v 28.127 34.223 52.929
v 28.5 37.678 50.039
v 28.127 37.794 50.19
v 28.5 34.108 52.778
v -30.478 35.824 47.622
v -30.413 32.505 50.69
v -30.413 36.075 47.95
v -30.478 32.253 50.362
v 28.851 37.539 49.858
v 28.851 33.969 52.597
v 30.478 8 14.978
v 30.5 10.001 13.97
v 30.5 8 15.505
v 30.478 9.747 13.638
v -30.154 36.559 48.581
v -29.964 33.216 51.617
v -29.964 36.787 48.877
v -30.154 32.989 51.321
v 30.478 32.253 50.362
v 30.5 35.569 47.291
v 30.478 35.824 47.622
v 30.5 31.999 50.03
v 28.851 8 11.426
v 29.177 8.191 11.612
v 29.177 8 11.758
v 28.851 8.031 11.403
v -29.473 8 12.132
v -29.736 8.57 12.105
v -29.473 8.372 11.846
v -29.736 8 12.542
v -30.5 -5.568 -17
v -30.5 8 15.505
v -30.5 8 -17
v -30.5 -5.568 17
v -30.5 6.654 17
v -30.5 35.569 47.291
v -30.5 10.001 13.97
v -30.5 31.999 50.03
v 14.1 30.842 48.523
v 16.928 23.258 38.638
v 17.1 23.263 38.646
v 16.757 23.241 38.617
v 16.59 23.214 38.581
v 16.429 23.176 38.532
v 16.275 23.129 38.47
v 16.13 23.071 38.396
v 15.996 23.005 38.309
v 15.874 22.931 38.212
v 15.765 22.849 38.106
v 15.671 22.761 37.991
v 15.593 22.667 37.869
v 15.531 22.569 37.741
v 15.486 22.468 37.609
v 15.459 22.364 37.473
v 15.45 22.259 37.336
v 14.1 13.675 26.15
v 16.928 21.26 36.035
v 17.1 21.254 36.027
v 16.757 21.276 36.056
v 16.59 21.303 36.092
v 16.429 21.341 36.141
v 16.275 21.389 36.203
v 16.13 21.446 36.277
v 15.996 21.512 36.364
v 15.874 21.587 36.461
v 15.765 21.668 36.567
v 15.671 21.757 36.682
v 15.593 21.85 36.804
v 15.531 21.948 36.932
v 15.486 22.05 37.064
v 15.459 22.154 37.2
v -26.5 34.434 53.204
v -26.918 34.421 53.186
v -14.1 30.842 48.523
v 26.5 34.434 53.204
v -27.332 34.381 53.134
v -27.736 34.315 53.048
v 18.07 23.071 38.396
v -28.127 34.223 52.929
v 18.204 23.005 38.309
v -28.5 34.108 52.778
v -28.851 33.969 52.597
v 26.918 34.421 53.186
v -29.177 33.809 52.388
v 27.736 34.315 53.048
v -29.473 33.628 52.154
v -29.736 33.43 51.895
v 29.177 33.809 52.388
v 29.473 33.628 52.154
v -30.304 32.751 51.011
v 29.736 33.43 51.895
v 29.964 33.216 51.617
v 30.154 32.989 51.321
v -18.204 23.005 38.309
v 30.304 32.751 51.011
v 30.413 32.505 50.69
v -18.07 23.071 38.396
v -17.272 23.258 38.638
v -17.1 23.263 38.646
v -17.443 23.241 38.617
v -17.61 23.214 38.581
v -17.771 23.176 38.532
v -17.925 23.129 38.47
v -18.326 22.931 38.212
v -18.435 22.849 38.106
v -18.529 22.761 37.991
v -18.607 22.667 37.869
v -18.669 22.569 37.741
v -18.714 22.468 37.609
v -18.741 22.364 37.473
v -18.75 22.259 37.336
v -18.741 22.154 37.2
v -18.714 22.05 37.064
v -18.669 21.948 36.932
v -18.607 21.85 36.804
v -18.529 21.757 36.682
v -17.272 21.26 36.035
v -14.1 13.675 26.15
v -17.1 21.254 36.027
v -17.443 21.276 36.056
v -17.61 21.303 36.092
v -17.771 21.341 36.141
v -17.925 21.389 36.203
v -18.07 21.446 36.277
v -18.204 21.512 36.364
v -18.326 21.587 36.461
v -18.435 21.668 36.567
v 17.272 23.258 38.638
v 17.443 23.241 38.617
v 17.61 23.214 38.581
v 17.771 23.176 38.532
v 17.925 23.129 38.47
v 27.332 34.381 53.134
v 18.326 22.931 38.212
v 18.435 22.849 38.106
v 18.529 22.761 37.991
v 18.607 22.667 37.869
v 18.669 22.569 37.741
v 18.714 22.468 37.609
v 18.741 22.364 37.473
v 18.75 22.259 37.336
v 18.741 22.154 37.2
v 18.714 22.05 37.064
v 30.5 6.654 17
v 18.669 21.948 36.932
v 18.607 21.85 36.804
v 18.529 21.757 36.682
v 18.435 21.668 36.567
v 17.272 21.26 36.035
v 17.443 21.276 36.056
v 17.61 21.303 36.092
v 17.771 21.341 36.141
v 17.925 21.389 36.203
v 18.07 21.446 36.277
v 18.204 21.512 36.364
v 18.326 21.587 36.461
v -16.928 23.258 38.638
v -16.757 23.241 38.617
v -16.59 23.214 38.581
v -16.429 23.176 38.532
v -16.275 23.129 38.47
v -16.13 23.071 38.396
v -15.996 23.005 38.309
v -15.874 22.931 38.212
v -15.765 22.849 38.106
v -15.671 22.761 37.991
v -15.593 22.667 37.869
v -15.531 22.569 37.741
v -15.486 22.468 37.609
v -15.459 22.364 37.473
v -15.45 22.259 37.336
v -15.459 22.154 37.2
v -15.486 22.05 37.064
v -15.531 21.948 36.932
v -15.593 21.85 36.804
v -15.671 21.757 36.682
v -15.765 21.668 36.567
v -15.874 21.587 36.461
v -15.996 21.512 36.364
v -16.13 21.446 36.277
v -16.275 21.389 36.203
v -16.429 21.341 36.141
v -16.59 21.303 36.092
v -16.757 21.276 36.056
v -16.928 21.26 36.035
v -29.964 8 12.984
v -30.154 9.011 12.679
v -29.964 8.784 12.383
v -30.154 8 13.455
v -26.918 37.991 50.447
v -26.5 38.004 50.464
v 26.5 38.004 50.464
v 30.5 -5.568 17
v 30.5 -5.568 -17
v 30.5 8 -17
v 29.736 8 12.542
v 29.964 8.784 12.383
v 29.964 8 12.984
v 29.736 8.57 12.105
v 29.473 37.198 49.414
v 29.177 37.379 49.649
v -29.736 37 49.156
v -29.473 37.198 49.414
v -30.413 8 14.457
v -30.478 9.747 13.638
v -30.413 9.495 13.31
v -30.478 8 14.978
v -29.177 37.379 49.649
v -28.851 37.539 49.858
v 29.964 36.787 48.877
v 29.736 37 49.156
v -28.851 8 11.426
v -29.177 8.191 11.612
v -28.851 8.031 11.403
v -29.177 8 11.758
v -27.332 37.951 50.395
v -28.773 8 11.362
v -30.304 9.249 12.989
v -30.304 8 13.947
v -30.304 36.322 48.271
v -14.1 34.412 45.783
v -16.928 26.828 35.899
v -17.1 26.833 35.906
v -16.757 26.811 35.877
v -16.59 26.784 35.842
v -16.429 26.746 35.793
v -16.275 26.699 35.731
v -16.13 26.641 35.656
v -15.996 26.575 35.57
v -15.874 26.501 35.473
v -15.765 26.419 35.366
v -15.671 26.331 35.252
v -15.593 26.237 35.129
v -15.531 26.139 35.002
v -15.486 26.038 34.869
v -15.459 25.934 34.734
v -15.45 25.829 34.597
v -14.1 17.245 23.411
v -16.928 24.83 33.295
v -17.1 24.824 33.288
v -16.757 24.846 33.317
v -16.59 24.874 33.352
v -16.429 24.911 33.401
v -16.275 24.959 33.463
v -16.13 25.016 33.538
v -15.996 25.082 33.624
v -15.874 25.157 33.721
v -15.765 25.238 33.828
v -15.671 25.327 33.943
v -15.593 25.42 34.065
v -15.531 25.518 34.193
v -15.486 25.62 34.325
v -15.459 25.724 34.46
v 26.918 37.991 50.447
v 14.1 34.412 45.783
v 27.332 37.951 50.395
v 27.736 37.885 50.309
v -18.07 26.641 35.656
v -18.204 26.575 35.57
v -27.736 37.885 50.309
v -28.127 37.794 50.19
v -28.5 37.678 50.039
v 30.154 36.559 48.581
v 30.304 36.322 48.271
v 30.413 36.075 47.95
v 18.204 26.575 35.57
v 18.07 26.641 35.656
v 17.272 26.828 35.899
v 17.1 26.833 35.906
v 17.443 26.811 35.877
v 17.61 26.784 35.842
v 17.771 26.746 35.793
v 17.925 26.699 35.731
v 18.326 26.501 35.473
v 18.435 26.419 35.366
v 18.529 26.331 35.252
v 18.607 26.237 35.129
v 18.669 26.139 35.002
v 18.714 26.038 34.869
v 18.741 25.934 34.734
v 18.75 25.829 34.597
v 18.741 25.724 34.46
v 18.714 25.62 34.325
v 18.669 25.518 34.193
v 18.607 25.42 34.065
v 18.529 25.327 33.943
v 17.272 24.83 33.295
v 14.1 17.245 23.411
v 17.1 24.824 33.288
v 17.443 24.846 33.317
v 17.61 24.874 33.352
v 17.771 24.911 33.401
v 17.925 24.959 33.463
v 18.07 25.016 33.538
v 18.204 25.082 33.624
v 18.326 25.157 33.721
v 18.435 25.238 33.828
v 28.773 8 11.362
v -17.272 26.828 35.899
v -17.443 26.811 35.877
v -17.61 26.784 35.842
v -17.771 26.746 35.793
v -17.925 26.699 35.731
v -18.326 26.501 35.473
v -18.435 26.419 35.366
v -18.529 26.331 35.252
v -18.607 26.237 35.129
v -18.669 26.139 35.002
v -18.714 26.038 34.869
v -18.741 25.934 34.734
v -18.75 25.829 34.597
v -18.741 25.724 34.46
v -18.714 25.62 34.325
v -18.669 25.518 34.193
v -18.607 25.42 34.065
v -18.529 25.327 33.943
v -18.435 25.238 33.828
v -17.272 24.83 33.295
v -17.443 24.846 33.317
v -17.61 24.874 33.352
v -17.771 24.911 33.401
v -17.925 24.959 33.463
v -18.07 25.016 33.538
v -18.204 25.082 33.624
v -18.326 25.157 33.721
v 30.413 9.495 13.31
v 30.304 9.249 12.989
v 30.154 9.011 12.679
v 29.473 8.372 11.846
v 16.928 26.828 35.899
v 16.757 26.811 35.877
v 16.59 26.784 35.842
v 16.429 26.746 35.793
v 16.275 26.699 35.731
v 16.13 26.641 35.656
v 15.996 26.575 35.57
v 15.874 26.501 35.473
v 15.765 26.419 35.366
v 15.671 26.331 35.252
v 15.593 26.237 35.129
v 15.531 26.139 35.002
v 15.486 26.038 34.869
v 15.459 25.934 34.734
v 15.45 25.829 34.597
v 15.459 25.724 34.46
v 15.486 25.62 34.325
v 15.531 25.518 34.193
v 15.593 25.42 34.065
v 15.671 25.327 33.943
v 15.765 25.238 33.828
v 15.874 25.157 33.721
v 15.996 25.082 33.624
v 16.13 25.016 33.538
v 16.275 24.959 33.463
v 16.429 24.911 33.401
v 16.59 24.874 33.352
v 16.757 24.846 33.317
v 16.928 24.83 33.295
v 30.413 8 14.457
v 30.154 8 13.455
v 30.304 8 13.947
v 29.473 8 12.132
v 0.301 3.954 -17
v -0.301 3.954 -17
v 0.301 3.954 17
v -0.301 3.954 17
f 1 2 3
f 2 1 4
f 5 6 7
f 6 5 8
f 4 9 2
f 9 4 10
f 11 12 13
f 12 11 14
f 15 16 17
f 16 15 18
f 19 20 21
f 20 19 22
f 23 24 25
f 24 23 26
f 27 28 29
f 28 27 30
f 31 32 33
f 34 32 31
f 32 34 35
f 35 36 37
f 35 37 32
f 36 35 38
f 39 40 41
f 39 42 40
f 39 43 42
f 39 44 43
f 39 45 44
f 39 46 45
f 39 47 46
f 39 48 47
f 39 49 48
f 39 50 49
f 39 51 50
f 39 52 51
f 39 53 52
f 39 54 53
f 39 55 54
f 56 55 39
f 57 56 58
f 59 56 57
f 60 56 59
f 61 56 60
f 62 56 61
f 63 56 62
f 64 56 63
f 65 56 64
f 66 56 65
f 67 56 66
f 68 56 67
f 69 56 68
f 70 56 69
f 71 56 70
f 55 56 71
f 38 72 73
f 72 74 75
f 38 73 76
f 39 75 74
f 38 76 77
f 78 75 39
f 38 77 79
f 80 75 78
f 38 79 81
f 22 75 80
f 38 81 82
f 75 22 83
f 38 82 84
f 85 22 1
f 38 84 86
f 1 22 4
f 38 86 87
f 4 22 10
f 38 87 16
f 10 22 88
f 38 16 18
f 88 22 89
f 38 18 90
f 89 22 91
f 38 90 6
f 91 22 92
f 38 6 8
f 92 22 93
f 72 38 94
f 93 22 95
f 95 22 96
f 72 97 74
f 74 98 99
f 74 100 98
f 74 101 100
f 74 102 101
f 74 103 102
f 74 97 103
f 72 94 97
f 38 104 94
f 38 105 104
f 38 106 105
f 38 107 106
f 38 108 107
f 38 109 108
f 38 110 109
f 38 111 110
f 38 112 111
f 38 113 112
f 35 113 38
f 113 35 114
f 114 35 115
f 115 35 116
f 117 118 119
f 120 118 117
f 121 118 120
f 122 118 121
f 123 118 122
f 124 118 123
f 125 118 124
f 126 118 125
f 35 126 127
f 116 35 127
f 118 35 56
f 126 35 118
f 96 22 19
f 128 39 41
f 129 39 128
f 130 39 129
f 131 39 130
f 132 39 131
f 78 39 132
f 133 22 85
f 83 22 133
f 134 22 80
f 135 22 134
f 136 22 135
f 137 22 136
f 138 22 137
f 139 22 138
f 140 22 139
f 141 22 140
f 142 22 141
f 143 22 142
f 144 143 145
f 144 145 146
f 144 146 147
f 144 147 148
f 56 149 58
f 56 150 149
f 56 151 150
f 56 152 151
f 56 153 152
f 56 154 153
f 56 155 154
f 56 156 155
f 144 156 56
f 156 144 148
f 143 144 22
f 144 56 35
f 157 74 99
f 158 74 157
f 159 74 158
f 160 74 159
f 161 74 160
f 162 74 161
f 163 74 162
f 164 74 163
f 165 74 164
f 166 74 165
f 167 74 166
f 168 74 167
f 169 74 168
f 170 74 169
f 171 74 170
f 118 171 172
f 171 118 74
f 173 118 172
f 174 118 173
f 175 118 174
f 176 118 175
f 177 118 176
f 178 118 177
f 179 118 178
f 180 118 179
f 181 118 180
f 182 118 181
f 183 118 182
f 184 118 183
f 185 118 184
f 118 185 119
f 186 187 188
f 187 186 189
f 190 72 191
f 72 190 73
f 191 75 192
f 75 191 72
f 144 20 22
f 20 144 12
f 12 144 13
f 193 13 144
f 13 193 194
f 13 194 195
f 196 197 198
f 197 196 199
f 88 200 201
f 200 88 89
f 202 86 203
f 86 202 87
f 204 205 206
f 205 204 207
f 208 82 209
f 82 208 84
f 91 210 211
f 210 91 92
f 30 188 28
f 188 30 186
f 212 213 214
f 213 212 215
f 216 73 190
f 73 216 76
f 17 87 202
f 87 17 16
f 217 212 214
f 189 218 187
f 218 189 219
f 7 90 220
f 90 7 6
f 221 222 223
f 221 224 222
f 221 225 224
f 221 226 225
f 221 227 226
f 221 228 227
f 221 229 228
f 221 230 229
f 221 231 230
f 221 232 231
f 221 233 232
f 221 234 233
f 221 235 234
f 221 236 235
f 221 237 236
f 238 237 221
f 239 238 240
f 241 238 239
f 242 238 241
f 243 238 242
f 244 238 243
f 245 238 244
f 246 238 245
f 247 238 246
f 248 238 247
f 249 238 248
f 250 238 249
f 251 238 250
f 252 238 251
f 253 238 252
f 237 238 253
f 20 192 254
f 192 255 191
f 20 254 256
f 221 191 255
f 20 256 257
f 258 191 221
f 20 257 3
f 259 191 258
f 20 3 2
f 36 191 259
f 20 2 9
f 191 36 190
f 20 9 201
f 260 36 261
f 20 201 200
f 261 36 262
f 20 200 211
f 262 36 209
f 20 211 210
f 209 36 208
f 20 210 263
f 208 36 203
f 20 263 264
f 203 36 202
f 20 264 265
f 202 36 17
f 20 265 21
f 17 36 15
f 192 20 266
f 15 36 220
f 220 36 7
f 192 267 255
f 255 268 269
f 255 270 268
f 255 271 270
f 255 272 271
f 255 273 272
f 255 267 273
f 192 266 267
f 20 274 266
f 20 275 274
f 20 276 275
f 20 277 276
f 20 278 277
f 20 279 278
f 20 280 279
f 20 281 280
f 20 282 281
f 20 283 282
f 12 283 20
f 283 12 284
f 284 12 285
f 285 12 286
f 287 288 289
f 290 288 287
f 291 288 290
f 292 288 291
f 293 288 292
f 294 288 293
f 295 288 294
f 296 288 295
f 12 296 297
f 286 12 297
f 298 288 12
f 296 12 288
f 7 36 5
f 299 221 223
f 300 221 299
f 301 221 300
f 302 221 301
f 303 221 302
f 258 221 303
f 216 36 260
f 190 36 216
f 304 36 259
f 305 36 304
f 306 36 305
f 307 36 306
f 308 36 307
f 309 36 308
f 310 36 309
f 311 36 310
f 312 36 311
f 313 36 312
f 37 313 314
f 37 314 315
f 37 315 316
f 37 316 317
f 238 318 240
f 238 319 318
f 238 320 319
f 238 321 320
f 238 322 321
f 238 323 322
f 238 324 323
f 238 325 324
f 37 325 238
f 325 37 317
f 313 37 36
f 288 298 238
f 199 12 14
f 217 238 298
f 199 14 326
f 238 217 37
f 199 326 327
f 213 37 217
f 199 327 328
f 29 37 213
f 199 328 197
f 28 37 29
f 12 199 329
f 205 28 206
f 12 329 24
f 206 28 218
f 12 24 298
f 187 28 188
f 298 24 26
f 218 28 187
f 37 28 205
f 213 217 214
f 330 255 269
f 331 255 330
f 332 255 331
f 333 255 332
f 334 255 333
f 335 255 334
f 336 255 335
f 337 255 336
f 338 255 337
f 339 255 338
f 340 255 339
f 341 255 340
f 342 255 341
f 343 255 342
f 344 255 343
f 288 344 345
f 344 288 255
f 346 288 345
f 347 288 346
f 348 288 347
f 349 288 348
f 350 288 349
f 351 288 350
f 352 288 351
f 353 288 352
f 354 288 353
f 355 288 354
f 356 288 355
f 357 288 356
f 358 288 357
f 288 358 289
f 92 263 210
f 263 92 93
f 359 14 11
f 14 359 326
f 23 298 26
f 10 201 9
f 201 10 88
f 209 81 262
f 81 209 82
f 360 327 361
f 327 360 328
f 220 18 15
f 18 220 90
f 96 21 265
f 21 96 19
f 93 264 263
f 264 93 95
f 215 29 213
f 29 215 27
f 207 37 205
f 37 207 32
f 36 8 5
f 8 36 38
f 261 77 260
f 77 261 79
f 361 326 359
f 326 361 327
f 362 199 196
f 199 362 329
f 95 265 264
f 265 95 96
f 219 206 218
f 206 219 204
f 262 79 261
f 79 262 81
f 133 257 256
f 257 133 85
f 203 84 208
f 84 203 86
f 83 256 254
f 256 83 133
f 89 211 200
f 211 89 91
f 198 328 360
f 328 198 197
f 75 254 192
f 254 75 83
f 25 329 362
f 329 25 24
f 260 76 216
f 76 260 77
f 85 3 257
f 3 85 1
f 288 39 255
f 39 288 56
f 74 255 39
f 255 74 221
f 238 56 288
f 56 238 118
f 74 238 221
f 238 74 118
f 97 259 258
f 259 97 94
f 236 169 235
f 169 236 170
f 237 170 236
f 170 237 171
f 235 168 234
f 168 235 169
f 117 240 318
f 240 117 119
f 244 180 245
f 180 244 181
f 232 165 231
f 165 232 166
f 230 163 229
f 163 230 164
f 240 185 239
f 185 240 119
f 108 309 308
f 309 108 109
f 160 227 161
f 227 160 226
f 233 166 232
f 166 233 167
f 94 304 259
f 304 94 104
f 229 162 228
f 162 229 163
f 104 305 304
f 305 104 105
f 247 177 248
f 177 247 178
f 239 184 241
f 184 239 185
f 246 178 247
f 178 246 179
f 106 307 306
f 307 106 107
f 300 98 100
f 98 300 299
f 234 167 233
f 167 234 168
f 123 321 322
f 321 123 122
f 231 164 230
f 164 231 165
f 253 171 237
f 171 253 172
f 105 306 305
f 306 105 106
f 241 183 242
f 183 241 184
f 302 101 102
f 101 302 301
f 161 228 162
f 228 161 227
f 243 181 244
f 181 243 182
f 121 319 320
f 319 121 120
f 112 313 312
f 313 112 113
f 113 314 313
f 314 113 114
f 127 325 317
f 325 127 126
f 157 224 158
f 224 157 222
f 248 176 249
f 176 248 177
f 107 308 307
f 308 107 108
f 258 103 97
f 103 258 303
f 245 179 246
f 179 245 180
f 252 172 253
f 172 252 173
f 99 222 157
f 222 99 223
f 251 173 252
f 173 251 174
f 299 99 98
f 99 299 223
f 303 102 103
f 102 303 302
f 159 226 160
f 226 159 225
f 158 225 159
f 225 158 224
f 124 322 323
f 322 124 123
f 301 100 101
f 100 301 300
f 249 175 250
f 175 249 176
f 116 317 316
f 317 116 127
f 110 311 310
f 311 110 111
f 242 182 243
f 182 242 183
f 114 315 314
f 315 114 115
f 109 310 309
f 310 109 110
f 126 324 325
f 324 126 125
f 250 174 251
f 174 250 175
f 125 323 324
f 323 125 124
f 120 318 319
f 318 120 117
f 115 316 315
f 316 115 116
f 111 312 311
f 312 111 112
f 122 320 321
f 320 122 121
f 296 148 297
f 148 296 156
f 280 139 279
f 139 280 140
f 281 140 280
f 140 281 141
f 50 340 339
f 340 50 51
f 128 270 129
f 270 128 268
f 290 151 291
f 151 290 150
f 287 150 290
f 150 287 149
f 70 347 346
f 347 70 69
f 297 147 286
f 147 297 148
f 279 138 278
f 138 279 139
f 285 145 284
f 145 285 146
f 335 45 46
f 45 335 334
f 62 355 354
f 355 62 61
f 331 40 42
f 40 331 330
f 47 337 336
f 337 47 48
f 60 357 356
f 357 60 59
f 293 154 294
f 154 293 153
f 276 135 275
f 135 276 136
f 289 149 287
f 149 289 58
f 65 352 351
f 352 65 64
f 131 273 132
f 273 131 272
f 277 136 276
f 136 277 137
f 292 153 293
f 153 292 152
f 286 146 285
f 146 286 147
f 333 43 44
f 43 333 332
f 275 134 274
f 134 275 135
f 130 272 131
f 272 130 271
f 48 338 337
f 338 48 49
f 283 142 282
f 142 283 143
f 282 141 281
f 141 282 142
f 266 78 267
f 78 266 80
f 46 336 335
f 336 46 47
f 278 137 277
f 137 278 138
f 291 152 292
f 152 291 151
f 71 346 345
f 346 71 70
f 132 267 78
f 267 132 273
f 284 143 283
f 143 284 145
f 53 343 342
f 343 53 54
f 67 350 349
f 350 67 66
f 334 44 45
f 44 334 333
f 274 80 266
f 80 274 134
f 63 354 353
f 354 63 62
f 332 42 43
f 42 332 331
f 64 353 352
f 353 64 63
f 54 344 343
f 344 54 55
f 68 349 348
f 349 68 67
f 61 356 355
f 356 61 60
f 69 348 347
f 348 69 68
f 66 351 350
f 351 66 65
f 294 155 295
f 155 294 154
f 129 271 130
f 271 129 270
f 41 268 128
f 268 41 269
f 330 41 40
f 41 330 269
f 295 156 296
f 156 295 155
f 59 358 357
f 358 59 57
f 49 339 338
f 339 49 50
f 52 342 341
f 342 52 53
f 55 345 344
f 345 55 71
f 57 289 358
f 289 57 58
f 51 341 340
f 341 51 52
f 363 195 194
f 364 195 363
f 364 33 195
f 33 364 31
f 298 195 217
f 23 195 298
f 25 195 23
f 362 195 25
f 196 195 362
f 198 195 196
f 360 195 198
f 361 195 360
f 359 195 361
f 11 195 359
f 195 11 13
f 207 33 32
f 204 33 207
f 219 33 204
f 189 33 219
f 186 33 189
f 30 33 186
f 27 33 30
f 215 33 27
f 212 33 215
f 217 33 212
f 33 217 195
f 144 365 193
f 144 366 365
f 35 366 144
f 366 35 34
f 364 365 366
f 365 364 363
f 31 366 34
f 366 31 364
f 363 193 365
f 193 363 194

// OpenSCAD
// file: mount_shim.scad
sheet_width = 40;
sheet_depth = 100;
sheet_height = 1;
roof_angle = 145;
    
module angled_sheet() {
    rotate([0, 90-roof_angle/2, 0]) {
        translate([0, -sheet_depth/2, 0]) {
            cube([sheet_width, sheet_depth, sheet_height]);
        }
    }
}

module angled_roof() {
    angled_sheet();
    mirror([1, 0, 0]) angled_sheet();
}

module angled_cutout() {
    hull() {
        angled_roof();
        translate([0, 0, -20]) {
            cube([sheet_width*2, sheet_depth, sheet_height], center = true);
        }
    }
}

module shim() {
    difference() {
        cube([34, 61, 16], center = true);
        translate([0, 0, 3]) rotate([0, 0, 90]) angled_cutout();
    }
}
// main file
include <mount_shim.scad>

$fn = 60;

mount_width = 61;
mount_height = 50;

hole_size = 28.2;
thickness = 4.5;

mount_hole_radius = 3.3/2;
mount_hole_vertical_separation = 9.5;

square_hole_z_offset = mount_height/10;

mount_angle = 37.5;

module hole() {
    rotate([90, 0, 0]) cylinder(h = thickness+1, r = mount_hole_radius, center = true);
}
    

module camera_holes() {
    offset = hole_size/2+3.0;
    offsets = [[-offset, 0], [offset, 0]];
    
    for(o = offsets) {
        echo(o);
        
        translate([o[0], 0, square_hole_z_offset+o[1]]) {
            hole();
        }
    }
}

module flat_rounded_cube(size, rounding_radius) {
    width = size[0];
    height = size[1];
    echo(width, height);
    x_offset = width/2 - rounding_radius;
    z_offset = height/2 - rounding_radius;
    
    hull() {
        for(x = [x_offset, -x_offset]) {
            for(z = [z_offset, -z_offset]) {
                translate([x, 0, z]) {
                    rotate([90, 0, 0]) {
                        cylinder(h = thickness, r = rounding_radius, center = true);
                    }
                }
            }
        }
    }
}

module mount_square() {
    flat_rounded_cube([mount_width, mount_height, thickness], 4);
}

module holy_mount_square() {
    difference() {
        mount_square();
        translate([0, 0, square_hole_z_offset]) {
            cube([hole_size, thickness + 1, hole_size], center = true);
        }
    }
}

module complete_mount() {
    difference() {
        holy_mount_square();
        camera_holes();
    }
}

module mount_on_shim() {
    translate([0, 21, 32]) rotate([-mount_angle, 0, 0]) complete_mount();
    rotate([0, 90, 90]) shim();
}

mount_on_shim();
